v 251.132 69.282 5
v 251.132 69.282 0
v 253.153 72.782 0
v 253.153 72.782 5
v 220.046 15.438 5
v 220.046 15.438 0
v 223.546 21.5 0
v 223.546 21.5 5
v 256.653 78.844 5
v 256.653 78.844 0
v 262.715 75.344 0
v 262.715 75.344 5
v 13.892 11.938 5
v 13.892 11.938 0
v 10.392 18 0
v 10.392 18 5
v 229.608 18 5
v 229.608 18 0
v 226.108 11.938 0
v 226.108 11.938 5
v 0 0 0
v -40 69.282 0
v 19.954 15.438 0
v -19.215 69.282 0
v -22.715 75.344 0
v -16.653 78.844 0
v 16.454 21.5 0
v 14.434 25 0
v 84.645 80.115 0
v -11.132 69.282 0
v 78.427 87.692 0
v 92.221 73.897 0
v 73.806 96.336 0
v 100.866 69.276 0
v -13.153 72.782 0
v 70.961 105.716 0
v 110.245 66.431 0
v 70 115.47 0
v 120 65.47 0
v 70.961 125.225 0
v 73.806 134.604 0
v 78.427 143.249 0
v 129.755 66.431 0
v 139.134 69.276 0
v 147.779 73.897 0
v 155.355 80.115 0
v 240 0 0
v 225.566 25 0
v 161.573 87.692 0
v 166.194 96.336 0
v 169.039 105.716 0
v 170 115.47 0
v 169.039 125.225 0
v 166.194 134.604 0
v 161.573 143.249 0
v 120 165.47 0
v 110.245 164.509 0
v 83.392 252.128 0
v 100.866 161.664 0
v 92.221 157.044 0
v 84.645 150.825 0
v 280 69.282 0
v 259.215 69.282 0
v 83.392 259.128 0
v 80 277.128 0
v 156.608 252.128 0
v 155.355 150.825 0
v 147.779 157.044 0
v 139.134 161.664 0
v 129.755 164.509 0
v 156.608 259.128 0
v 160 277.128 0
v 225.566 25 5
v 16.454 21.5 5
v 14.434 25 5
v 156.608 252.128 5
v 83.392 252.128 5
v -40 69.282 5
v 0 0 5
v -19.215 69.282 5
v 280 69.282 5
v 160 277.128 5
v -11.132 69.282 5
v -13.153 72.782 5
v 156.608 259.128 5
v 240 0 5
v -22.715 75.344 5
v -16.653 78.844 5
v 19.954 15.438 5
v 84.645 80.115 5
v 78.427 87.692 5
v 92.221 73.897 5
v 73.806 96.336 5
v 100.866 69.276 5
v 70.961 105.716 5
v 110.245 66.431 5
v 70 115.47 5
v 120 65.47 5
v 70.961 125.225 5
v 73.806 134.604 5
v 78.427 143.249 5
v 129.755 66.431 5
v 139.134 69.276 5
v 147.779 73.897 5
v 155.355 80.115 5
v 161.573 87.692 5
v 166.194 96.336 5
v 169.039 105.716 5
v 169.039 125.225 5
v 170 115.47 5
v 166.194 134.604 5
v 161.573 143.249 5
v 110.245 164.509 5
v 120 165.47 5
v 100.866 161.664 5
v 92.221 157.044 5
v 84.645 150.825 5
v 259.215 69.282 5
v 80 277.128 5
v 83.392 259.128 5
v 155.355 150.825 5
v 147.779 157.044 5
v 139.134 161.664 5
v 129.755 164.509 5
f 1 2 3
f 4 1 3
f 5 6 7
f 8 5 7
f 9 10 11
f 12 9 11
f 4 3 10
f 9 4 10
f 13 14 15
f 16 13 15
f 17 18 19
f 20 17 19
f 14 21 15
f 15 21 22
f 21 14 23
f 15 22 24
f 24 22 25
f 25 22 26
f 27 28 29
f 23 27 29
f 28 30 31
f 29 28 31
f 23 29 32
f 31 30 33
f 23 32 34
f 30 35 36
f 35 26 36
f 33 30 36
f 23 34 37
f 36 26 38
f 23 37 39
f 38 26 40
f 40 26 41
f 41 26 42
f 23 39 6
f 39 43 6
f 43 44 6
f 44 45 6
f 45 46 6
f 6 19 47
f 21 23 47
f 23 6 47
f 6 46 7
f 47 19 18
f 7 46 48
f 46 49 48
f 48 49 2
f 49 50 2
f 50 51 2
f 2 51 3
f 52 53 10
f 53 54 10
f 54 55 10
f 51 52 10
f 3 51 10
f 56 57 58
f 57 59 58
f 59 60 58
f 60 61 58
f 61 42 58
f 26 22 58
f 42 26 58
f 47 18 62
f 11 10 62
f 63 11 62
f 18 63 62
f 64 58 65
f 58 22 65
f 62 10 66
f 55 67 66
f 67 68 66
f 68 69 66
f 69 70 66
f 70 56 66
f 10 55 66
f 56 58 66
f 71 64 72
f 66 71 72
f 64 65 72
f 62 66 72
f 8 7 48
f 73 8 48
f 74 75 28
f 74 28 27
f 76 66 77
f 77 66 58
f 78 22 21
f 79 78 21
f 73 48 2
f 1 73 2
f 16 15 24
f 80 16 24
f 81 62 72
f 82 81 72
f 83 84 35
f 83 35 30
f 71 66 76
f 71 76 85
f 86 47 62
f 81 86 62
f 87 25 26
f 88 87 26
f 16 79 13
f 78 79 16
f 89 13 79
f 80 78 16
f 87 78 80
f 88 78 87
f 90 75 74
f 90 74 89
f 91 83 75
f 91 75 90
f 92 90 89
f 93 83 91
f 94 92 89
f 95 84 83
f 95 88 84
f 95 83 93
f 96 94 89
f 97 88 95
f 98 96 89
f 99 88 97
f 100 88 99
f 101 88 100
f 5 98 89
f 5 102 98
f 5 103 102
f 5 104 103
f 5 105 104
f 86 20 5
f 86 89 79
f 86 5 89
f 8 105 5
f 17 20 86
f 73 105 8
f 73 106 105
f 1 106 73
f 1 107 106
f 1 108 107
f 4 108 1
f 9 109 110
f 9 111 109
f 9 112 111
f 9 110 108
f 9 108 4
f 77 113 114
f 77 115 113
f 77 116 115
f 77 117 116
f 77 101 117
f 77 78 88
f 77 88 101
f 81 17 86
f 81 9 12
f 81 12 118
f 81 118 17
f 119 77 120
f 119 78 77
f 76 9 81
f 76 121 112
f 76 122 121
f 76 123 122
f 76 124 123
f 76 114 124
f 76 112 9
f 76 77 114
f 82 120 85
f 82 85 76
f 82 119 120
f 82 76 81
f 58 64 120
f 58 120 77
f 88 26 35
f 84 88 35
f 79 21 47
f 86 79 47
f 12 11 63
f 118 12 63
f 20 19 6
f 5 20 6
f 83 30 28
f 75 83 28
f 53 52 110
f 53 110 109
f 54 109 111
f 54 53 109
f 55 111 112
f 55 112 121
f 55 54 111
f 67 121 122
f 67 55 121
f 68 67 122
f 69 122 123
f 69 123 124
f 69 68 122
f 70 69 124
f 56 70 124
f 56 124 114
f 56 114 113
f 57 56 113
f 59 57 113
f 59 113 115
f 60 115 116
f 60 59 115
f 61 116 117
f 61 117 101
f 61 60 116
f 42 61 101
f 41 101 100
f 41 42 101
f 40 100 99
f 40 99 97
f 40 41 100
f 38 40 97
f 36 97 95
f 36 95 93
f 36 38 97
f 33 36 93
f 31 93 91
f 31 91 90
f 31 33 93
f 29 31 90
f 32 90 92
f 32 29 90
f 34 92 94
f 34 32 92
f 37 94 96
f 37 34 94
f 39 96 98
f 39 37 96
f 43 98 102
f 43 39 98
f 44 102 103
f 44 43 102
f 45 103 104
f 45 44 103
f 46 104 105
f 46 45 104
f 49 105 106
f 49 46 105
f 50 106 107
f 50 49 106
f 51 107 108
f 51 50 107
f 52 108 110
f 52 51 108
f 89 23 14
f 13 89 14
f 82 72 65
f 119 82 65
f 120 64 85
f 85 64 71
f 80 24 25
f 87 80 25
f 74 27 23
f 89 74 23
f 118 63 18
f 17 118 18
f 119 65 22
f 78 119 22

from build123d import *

# Parameters (mm, degrees)
SKETCH1_R           = 50
BOSS_EXTRUDE1_DEPTH = 5


with BuildPart() as part:
    # Sketch1 → Boss-Extrude1 (new body)
    with BuildSketch(Plane.XY):
        Polygon((0, 0), (240, 0), (280, 69.282032303), (160, 277.128129211), (80, 277.128129211), (-40, 69.282032303), align=None)
        with Locations((120, 115.470053838)):
            Circle(SKETCH1_R, mode=Mode.SUBTRACT)
        Polygon((149.607695155, 259.128129211), (90.392304845, 259.128129211), (83.392304845, 259.128129211), (83.392304845, 252.128129211), (90.392304845, 252.128129211), (94.43375673, 252.128129211), (145.56624327, 252.128129211), (149.607695155, 252.128129211), (156.607695155, 252.128129211), (156.607695155, 259.128129211), align=None, mode=Mode.SUBTRACT)
        Polygon((225.56624327, 25), (251.132486541, 69.282032303), (253.153212483, 72.782032303), (256.653212483, 78.844210129), (262.715390309, 75.344210129), (259.215390309, 69.282032303), (229.607695155, 18), (226.107695155, 11.937822174), (220.045517328, 15.437822174), (223.545517328, 21.5), align=None, mode=Mode.SUBTRACT)
        Polygon((-11.132486541, 69.282032303), (14.43375673, 25), (16.454482672, 21.5), (19.954482672, 15.437822174), (13.892304845, 11.937822174), (10.392304845, 18), (-19.215390309, 69.282032303), (-22.715390309, 75.344210129), (-16.653212483, 78.844210129), (-13.153212483, 72.782032303), align=None, mode=Mode.SUBTRACT)
    extrude(amount=BOSS_EXTRUDE1_DEPTH)


solid = part.part
